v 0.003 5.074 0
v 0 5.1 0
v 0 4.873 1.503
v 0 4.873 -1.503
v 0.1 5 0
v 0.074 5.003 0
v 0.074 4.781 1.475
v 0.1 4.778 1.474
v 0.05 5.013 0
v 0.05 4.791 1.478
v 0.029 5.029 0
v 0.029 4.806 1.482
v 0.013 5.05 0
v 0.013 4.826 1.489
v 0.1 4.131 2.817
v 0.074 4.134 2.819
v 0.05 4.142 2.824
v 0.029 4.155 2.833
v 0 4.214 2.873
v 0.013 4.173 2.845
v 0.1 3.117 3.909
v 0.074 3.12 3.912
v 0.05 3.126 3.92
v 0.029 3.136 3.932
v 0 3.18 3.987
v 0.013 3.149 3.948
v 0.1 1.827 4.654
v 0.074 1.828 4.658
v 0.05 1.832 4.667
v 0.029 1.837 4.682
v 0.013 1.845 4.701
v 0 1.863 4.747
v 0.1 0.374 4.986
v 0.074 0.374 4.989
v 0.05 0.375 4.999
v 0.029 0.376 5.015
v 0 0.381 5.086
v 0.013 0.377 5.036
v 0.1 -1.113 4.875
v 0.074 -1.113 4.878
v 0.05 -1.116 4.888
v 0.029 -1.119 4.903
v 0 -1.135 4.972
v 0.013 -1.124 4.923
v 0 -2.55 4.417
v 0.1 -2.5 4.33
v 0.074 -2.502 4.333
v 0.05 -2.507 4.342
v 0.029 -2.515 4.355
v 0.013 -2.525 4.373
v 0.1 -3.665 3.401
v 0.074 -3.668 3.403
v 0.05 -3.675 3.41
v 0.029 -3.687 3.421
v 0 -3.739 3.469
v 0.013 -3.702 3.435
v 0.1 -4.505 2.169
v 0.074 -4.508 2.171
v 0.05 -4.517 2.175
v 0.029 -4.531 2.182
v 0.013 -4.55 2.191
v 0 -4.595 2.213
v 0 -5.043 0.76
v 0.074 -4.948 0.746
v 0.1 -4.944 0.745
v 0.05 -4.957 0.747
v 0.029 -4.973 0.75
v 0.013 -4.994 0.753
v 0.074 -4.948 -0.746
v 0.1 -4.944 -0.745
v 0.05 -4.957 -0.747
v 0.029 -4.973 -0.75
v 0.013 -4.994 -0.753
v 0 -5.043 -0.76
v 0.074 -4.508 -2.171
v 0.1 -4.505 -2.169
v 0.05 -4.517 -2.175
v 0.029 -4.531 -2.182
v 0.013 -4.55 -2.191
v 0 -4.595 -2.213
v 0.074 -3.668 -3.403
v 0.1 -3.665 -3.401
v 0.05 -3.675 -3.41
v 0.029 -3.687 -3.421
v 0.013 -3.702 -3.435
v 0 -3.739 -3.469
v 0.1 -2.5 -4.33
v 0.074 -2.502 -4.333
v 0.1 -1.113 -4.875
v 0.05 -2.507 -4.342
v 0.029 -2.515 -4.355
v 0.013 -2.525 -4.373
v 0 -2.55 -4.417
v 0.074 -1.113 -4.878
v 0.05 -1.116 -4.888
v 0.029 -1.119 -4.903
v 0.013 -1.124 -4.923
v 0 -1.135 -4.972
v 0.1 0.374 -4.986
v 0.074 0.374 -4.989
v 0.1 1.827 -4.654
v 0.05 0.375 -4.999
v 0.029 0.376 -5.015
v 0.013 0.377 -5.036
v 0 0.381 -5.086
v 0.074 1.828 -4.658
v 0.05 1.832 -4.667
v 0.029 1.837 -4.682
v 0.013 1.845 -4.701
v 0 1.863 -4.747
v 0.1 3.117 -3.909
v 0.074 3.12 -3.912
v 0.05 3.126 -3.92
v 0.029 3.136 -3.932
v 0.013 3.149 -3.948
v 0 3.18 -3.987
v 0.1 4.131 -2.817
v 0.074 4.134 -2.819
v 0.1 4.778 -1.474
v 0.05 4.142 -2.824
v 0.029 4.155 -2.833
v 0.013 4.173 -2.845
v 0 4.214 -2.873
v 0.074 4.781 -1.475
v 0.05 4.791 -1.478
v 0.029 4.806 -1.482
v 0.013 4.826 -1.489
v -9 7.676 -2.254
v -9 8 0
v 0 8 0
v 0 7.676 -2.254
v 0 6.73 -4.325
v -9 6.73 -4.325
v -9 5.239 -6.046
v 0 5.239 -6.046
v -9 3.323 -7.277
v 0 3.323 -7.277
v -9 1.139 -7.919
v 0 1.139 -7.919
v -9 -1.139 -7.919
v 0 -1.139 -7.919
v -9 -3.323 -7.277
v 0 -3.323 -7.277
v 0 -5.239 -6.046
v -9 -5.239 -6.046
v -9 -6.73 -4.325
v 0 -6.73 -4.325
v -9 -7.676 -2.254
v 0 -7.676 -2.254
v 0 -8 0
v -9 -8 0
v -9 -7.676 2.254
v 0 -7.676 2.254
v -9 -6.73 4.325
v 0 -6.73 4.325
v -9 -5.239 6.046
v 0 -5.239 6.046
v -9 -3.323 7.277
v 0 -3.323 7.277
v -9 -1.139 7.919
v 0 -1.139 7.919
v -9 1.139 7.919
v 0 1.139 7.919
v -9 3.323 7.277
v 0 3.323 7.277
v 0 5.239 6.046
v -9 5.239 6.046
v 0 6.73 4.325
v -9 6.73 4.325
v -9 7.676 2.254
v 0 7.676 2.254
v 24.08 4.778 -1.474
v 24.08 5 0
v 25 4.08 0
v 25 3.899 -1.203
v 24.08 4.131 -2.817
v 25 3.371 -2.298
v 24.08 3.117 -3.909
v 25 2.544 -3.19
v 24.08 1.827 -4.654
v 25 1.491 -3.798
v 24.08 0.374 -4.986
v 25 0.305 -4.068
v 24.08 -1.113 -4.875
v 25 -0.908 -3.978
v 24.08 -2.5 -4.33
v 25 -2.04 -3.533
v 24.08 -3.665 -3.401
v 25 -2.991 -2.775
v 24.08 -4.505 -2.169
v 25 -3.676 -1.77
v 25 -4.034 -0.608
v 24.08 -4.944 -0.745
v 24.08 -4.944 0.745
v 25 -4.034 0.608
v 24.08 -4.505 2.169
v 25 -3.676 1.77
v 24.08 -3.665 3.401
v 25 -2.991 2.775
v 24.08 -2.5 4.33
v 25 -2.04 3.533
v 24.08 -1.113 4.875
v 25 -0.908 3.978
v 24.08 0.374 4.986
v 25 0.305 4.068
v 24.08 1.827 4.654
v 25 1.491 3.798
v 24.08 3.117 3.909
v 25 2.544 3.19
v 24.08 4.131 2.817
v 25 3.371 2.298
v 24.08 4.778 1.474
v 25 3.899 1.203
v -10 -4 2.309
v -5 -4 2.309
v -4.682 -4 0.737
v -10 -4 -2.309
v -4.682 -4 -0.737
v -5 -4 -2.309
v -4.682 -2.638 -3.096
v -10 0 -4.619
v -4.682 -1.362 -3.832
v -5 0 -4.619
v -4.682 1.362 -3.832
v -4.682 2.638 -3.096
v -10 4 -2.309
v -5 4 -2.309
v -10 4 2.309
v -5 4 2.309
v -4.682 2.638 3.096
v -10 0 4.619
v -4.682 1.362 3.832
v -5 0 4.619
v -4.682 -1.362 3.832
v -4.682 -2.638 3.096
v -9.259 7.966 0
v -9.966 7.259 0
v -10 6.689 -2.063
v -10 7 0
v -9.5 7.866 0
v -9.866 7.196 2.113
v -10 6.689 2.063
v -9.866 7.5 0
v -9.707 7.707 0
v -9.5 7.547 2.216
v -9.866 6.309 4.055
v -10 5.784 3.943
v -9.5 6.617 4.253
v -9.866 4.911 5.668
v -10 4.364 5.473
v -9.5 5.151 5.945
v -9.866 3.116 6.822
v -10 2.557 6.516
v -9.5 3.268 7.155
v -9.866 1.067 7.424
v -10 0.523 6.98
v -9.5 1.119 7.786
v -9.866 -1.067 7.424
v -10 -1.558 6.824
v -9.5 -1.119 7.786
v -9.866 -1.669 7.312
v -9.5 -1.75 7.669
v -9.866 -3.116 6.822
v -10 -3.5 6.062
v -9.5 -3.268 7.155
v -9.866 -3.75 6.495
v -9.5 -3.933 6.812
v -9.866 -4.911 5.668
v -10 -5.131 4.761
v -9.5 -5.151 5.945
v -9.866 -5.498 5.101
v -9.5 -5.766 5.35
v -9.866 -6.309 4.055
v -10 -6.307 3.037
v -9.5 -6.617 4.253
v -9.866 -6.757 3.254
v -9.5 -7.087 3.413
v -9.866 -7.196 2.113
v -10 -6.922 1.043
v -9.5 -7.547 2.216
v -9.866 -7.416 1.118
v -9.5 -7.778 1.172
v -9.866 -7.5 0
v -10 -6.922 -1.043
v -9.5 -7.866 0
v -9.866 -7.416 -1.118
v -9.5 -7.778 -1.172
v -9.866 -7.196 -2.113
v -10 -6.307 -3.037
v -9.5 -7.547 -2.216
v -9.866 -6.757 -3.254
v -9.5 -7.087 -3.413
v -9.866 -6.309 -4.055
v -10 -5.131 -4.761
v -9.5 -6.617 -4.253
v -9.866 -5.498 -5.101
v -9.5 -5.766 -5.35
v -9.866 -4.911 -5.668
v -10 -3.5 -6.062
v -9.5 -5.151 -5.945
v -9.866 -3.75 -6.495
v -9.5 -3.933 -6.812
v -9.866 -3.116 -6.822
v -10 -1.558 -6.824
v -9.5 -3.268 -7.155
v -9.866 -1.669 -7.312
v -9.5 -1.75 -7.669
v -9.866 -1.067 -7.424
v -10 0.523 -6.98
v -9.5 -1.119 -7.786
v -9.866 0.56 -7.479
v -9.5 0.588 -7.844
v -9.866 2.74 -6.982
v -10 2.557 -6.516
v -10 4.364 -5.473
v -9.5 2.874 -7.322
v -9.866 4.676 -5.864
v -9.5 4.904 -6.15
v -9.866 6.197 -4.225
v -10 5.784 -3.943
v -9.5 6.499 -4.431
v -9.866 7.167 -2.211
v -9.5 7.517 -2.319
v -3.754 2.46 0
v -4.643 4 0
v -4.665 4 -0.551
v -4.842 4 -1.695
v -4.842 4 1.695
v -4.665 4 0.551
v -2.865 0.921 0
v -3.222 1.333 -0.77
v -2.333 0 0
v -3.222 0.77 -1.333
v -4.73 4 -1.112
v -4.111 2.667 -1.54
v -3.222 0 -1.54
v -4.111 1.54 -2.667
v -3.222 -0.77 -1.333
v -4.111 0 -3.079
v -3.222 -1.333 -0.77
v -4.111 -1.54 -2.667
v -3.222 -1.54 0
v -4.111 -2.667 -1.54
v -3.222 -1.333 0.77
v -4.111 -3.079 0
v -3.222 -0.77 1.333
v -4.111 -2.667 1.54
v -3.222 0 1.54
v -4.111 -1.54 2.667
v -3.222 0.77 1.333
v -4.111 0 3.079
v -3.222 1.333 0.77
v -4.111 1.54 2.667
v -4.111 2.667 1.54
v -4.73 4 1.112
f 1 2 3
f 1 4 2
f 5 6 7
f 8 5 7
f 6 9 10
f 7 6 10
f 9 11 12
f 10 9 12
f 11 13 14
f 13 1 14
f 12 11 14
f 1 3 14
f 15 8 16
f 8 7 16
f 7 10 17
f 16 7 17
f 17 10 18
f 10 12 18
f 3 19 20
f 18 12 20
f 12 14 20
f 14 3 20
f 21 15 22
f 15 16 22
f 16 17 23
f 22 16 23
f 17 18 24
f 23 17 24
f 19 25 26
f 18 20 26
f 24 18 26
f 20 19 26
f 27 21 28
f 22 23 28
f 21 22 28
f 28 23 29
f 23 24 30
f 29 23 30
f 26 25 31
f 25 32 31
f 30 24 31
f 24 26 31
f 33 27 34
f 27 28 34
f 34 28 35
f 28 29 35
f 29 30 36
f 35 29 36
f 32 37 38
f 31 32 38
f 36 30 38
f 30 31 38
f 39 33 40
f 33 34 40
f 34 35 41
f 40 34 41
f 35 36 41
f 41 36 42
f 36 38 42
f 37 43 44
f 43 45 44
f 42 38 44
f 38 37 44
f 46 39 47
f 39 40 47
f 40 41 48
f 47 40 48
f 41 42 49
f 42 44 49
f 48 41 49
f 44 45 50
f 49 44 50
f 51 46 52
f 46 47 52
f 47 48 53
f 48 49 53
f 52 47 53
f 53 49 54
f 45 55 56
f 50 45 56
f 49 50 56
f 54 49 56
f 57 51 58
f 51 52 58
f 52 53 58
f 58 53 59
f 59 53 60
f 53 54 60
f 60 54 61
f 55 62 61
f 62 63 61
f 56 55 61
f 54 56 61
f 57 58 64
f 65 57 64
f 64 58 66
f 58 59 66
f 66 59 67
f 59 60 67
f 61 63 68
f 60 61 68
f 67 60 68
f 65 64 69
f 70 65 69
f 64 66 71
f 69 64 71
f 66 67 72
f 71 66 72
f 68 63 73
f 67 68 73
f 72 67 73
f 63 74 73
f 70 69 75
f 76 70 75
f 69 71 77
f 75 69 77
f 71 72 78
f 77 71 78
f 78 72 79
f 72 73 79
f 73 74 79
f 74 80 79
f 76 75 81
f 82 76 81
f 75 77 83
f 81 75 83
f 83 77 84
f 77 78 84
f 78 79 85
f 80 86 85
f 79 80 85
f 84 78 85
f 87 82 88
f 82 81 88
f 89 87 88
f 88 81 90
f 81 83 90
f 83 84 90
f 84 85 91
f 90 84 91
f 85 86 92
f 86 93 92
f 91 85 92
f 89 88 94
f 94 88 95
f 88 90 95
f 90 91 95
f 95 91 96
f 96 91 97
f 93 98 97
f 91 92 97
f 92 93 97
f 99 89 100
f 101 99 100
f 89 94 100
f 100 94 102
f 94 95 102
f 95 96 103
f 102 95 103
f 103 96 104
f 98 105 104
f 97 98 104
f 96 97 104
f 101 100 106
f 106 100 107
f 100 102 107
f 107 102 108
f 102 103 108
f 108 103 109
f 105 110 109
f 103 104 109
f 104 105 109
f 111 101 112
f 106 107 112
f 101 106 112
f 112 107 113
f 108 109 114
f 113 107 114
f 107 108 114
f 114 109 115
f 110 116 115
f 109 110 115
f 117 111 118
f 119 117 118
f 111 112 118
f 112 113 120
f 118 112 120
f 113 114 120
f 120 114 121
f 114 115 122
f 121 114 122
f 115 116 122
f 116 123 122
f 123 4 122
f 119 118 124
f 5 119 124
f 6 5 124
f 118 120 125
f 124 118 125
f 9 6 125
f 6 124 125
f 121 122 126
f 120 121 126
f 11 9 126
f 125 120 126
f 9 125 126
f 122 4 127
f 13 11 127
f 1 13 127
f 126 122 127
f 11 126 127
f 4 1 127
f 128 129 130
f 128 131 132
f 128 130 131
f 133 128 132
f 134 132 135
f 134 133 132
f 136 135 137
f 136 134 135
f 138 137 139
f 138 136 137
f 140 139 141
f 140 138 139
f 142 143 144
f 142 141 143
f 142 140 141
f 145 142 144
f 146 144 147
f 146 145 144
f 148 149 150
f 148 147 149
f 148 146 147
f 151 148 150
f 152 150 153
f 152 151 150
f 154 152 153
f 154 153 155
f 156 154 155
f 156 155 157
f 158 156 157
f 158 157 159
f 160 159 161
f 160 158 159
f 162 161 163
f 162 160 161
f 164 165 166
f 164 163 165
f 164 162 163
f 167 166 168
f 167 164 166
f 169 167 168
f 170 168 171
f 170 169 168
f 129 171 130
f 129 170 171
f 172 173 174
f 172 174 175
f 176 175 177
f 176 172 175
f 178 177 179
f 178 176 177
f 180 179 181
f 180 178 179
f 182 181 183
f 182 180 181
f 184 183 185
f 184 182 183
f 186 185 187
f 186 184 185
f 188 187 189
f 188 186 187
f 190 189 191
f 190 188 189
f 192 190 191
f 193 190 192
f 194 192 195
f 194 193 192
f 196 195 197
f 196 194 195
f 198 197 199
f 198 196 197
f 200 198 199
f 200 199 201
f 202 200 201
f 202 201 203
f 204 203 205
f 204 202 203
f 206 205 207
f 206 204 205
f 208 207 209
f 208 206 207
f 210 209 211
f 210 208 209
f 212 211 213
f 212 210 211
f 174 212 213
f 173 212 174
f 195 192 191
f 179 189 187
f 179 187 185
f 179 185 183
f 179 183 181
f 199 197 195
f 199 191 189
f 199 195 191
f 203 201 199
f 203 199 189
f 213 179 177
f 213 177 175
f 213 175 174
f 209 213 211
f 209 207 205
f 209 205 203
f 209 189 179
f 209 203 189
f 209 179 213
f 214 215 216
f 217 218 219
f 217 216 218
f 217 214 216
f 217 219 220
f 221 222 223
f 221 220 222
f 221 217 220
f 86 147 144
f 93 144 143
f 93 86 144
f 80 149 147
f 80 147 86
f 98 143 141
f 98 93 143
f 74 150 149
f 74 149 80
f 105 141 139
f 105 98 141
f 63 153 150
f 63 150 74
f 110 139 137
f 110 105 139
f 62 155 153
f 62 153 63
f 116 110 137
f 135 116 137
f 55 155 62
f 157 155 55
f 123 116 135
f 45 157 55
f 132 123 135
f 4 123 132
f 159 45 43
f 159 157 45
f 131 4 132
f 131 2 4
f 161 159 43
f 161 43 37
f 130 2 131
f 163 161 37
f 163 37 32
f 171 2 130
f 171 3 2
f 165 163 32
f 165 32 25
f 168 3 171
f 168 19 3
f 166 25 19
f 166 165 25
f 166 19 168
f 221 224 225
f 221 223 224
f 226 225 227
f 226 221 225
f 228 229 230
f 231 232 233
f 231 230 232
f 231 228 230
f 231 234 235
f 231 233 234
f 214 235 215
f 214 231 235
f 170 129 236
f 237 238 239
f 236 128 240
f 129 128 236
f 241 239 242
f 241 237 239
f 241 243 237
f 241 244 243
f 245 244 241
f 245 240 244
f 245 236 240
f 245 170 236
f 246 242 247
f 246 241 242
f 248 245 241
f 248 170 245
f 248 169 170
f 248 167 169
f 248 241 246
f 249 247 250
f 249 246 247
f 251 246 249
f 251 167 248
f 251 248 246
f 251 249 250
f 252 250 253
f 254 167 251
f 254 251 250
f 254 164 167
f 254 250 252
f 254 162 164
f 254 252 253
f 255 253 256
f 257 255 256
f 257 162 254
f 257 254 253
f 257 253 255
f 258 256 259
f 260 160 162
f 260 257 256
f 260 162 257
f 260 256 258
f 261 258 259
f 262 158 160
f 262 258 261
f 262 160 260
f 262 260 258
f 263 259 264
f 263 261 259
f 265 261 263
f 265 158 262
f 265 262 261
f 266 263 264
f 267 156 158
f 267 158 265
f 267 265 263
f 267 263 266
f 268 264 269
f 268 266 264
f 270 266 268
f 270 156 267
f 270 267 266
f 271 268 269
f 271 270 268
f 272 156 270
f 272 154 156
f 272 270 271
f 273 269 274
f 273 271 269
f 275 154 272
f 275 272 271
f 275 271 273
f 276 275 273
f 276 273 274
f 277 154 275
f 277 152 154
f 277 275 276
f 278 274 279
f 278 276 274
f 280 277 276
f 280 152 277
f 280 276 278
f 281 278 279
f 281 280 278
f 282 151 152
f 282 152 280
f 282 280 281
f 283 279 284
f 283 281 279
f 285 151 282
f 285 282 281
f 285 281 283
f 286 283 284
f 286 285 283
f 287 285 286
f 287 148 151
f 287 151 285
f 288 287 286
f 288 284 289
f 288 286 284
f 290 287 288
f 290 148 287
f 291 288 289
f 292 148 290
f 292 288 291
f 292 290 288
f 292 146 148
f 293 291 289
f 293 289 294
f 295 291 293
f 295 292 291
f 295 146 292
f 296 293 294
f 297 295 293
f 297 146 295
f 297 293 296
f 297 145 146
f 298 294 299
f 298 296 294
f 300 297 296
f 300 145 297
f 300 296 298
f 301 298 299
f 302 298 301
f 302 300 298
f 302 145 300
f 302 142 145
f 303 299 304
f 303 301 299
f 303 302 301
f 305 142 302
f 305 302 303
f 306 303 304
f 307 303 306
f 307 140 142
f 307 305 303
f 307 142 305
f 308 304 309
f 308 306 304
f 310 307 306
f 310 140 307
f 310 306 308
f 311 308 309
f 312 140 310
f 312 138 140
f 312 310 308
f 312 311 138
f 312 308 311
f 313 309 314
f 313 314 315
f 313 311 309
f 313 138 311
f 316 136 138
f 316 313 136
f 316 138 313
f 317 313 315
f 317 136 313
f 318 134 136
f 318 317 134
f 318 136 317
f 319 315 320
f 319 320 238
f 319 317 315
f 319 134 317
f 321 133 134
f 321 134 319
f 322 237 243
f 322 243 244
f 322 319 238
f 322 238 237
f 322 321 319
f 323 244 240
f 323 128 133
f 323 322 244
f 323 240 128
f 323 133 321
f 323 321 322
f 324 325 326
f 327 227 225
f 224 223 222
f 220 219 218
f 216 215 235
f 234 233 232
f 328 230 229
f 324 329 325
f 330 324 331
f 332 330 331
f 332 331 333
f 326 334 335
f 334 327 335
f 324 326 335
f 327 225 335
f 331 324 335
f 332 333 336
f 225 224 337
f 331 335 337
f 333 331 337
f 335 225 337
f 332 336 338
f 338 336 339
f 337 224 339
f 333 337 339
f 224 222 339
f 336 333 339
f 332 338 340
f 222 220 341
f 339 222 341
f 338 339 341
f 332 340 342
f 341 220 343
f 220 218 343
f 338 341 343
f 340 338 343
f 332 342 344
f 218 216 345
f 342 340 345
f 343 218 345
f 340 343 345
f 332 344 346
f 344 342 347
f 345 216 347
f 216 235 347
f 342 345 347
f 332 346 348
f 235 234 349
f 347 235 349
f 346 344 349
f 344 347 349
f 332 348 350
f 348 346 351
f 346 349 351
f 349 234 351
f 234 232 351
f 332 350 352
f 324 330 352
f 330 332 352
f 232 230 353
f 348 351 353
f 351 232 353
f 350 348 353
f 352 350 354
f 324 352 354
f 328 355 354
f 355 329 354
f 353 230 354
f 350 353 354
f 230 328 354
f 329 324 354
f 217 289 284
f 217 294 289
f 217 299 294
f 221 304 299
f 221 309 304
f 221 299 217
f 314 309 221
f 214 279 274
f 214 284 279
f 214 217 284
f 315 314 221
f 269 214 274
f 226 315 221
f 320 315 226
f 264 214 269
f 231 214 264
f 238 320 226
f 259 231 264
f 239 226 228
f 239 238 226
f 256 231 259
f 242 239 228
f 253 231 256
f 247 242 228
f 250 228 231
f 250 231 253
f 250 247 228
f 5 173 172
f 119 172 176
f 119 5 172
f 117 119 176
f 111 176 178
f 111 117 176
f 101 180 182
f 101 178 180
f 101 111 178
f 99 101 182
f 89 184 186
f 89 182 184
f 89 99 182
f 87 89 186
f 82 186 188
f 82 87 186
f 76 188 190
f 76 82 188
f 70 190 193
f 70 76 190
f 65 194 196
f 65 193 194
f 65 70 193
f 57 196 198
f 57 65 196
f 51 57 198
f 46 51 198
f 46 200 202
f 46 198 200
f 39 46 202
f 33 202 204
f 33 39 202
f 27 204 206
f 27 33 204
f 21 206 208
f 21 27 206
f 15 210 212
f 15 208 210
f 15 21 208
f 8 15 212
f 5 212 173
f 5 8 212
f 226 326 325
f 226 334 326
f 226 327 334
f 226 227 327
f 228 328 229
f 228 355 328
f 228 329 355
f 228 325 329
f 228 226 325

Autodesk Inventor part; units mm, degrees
ref_plane "YZ Plane" through (0, 0, 0) normal (1, 0, 0) x (0, 1, 0)
ref_plane "XZ Plane" through (0, 0, 0) normal (0, 1, 0) x (-1, 0, 0)
sketch "스케치1" plane through (0, 0, 0) normal (0, 0, 1) x (1, 0, 0)
  line L0 (-2.3333, 0) -> (25, 0)
  line L1 (25, 0) -> (25, 5)
  line L2 (25, 5) -> (3.75, 5)
  line L3 (3.75, 5) -> (2.8297, 5)
  line L4 (2.8297, 5) -> (0, 5)
  line L5 (0, 5) -> (0, 8)
  line L6 (0, 8) -> (-10, 8)
  line L7 (-10, 8) -> (-10, 4.6188)
  line L8 (-10, 4.6188) -> (-5, 4.6188)
  line L9 (-5, 4.6188) -> (-2.3333, 0)
  line L10 (-17, 0) -> (32, 0) projected
  line L11 (0, -1.6) -> (0, 9.6) projected
  line L12 (3.75, 5) -> (0, 5) construction
  dimension "d1" = 21.25
  dimension "d2" = 0.9203
  dimension "d3" = 10
  dimension "d4" = 5
  dimension "d5" = 60
  dimension "d6" = 10
  dimension "d7" = 10
  dimension "d8" = 9.2376
  dimension "d9" = 16
  dimension "d26" = 25
revolve "본체" add sketch "스케치1" angle 360 about axis through (-2.3333, 0, 0) along (1, 0, 0)
sketch "스케치2" plane through (-10, 0, 0) normal (-1, 0, 0) x (0, 0, 1)
  circle A0 centre (0, 0) radius 4.6188 projected
  line L0 (0, -11.2) -> (0, 11.2) projected
  line L1 (-11.2, 0) -> (11.2, 0) projected
  line L2 (4.6188, 0) -> (2.3094, -4)
  line L3 (2.3094, -4) -> (-2.3094, -4)
  line L4 (-2.3094, -4) -> (-4.6188, 0)
  line L5 (-4.6188, 0) -> (-2.3094, 4)
  line L6 (-2.3094, 4) -> (2.3094, 4)
  line L7 (2.3094, 4) -> (4.6188, 0)
  point P0 (0, 0)
extrude "슬롯" add sketch "스케치2" against normal up to next contours L7 A0 | A0 L2 | L6 L0 A0 | A0 L0 L3 | L0 L6 A0 | A0 L3 L0 | L4 A0 | A0 L5
fillet "모깎기1" radius 1 1 edges at (-10, -8, 0)
thread "스레드" size "M10x1.5" class "6g" standard "ISO Metric profile" length 21.25
chamfer "모따기1" distance 0.9202 distance2 0.9202 1 edges at (25, -5, 0) measured on face at (25, -0.8193, -0.3214)
ref_plane "Work Plane1" through (29, 0, 0) normal (0, -1, 0) x (1, 0, 0)
fillet "Fillet2" radius 0.1 1 edges at (0, -5, 0)
equation "\"d1\" = GEL"
equation "\"d3\" = KOH"
equation "\"d4\" = INTI"
equation "\"d6\" = GD"
equation "\"d7\" = BDM"
equation "\"d8\" = 1.1547 * SW"
equation "\"d9\" = KOD"
equation "\"d26\" = NLG"
equation "\"d30\" = R"
equation "\"d17\" = RR"
equation "\"d13\" = GEL"
equation "\"d15\" = -0.5 * SPD + 0.5 * GD"
equation "\"d16\" = GUL"
equation "\"GD\" = 10"
equation "\"NLG\" = 25"
equation "\"GEL\" = 21.25"
equation "\"KOD\" = 16"
equation "\"KOH\" = 10"
equation "\"INTI\" = 5"
equation "\"GAL\" = 0.61345 * PTC"
equation "\"GUL\" = 0.61345 * PTC"
equation "\"BDM\" = NND"
equation "\"SW\" = 8"
equation "\"RR\" = 1"
equation "\"SPD\" = NND - 1.2269 * PTC"
equation "\"R\" = 0.1"
equation "\"TOA\" = 30deg"
equation "\"GD1\" = THREADDIA - 1.2269 * PTC"
equation "\"FAWI\" = 45deg"
equation "\"PTC\" = 1.5"
equation "\"E0\" = 1.155 * SW"
equation "\"NND\" = 10"
equation "\"THREADDIA\" = 10"
properties part number "ISO 4762 - M10 x 25(1)" material "스테인레스 스틸, 440C"
